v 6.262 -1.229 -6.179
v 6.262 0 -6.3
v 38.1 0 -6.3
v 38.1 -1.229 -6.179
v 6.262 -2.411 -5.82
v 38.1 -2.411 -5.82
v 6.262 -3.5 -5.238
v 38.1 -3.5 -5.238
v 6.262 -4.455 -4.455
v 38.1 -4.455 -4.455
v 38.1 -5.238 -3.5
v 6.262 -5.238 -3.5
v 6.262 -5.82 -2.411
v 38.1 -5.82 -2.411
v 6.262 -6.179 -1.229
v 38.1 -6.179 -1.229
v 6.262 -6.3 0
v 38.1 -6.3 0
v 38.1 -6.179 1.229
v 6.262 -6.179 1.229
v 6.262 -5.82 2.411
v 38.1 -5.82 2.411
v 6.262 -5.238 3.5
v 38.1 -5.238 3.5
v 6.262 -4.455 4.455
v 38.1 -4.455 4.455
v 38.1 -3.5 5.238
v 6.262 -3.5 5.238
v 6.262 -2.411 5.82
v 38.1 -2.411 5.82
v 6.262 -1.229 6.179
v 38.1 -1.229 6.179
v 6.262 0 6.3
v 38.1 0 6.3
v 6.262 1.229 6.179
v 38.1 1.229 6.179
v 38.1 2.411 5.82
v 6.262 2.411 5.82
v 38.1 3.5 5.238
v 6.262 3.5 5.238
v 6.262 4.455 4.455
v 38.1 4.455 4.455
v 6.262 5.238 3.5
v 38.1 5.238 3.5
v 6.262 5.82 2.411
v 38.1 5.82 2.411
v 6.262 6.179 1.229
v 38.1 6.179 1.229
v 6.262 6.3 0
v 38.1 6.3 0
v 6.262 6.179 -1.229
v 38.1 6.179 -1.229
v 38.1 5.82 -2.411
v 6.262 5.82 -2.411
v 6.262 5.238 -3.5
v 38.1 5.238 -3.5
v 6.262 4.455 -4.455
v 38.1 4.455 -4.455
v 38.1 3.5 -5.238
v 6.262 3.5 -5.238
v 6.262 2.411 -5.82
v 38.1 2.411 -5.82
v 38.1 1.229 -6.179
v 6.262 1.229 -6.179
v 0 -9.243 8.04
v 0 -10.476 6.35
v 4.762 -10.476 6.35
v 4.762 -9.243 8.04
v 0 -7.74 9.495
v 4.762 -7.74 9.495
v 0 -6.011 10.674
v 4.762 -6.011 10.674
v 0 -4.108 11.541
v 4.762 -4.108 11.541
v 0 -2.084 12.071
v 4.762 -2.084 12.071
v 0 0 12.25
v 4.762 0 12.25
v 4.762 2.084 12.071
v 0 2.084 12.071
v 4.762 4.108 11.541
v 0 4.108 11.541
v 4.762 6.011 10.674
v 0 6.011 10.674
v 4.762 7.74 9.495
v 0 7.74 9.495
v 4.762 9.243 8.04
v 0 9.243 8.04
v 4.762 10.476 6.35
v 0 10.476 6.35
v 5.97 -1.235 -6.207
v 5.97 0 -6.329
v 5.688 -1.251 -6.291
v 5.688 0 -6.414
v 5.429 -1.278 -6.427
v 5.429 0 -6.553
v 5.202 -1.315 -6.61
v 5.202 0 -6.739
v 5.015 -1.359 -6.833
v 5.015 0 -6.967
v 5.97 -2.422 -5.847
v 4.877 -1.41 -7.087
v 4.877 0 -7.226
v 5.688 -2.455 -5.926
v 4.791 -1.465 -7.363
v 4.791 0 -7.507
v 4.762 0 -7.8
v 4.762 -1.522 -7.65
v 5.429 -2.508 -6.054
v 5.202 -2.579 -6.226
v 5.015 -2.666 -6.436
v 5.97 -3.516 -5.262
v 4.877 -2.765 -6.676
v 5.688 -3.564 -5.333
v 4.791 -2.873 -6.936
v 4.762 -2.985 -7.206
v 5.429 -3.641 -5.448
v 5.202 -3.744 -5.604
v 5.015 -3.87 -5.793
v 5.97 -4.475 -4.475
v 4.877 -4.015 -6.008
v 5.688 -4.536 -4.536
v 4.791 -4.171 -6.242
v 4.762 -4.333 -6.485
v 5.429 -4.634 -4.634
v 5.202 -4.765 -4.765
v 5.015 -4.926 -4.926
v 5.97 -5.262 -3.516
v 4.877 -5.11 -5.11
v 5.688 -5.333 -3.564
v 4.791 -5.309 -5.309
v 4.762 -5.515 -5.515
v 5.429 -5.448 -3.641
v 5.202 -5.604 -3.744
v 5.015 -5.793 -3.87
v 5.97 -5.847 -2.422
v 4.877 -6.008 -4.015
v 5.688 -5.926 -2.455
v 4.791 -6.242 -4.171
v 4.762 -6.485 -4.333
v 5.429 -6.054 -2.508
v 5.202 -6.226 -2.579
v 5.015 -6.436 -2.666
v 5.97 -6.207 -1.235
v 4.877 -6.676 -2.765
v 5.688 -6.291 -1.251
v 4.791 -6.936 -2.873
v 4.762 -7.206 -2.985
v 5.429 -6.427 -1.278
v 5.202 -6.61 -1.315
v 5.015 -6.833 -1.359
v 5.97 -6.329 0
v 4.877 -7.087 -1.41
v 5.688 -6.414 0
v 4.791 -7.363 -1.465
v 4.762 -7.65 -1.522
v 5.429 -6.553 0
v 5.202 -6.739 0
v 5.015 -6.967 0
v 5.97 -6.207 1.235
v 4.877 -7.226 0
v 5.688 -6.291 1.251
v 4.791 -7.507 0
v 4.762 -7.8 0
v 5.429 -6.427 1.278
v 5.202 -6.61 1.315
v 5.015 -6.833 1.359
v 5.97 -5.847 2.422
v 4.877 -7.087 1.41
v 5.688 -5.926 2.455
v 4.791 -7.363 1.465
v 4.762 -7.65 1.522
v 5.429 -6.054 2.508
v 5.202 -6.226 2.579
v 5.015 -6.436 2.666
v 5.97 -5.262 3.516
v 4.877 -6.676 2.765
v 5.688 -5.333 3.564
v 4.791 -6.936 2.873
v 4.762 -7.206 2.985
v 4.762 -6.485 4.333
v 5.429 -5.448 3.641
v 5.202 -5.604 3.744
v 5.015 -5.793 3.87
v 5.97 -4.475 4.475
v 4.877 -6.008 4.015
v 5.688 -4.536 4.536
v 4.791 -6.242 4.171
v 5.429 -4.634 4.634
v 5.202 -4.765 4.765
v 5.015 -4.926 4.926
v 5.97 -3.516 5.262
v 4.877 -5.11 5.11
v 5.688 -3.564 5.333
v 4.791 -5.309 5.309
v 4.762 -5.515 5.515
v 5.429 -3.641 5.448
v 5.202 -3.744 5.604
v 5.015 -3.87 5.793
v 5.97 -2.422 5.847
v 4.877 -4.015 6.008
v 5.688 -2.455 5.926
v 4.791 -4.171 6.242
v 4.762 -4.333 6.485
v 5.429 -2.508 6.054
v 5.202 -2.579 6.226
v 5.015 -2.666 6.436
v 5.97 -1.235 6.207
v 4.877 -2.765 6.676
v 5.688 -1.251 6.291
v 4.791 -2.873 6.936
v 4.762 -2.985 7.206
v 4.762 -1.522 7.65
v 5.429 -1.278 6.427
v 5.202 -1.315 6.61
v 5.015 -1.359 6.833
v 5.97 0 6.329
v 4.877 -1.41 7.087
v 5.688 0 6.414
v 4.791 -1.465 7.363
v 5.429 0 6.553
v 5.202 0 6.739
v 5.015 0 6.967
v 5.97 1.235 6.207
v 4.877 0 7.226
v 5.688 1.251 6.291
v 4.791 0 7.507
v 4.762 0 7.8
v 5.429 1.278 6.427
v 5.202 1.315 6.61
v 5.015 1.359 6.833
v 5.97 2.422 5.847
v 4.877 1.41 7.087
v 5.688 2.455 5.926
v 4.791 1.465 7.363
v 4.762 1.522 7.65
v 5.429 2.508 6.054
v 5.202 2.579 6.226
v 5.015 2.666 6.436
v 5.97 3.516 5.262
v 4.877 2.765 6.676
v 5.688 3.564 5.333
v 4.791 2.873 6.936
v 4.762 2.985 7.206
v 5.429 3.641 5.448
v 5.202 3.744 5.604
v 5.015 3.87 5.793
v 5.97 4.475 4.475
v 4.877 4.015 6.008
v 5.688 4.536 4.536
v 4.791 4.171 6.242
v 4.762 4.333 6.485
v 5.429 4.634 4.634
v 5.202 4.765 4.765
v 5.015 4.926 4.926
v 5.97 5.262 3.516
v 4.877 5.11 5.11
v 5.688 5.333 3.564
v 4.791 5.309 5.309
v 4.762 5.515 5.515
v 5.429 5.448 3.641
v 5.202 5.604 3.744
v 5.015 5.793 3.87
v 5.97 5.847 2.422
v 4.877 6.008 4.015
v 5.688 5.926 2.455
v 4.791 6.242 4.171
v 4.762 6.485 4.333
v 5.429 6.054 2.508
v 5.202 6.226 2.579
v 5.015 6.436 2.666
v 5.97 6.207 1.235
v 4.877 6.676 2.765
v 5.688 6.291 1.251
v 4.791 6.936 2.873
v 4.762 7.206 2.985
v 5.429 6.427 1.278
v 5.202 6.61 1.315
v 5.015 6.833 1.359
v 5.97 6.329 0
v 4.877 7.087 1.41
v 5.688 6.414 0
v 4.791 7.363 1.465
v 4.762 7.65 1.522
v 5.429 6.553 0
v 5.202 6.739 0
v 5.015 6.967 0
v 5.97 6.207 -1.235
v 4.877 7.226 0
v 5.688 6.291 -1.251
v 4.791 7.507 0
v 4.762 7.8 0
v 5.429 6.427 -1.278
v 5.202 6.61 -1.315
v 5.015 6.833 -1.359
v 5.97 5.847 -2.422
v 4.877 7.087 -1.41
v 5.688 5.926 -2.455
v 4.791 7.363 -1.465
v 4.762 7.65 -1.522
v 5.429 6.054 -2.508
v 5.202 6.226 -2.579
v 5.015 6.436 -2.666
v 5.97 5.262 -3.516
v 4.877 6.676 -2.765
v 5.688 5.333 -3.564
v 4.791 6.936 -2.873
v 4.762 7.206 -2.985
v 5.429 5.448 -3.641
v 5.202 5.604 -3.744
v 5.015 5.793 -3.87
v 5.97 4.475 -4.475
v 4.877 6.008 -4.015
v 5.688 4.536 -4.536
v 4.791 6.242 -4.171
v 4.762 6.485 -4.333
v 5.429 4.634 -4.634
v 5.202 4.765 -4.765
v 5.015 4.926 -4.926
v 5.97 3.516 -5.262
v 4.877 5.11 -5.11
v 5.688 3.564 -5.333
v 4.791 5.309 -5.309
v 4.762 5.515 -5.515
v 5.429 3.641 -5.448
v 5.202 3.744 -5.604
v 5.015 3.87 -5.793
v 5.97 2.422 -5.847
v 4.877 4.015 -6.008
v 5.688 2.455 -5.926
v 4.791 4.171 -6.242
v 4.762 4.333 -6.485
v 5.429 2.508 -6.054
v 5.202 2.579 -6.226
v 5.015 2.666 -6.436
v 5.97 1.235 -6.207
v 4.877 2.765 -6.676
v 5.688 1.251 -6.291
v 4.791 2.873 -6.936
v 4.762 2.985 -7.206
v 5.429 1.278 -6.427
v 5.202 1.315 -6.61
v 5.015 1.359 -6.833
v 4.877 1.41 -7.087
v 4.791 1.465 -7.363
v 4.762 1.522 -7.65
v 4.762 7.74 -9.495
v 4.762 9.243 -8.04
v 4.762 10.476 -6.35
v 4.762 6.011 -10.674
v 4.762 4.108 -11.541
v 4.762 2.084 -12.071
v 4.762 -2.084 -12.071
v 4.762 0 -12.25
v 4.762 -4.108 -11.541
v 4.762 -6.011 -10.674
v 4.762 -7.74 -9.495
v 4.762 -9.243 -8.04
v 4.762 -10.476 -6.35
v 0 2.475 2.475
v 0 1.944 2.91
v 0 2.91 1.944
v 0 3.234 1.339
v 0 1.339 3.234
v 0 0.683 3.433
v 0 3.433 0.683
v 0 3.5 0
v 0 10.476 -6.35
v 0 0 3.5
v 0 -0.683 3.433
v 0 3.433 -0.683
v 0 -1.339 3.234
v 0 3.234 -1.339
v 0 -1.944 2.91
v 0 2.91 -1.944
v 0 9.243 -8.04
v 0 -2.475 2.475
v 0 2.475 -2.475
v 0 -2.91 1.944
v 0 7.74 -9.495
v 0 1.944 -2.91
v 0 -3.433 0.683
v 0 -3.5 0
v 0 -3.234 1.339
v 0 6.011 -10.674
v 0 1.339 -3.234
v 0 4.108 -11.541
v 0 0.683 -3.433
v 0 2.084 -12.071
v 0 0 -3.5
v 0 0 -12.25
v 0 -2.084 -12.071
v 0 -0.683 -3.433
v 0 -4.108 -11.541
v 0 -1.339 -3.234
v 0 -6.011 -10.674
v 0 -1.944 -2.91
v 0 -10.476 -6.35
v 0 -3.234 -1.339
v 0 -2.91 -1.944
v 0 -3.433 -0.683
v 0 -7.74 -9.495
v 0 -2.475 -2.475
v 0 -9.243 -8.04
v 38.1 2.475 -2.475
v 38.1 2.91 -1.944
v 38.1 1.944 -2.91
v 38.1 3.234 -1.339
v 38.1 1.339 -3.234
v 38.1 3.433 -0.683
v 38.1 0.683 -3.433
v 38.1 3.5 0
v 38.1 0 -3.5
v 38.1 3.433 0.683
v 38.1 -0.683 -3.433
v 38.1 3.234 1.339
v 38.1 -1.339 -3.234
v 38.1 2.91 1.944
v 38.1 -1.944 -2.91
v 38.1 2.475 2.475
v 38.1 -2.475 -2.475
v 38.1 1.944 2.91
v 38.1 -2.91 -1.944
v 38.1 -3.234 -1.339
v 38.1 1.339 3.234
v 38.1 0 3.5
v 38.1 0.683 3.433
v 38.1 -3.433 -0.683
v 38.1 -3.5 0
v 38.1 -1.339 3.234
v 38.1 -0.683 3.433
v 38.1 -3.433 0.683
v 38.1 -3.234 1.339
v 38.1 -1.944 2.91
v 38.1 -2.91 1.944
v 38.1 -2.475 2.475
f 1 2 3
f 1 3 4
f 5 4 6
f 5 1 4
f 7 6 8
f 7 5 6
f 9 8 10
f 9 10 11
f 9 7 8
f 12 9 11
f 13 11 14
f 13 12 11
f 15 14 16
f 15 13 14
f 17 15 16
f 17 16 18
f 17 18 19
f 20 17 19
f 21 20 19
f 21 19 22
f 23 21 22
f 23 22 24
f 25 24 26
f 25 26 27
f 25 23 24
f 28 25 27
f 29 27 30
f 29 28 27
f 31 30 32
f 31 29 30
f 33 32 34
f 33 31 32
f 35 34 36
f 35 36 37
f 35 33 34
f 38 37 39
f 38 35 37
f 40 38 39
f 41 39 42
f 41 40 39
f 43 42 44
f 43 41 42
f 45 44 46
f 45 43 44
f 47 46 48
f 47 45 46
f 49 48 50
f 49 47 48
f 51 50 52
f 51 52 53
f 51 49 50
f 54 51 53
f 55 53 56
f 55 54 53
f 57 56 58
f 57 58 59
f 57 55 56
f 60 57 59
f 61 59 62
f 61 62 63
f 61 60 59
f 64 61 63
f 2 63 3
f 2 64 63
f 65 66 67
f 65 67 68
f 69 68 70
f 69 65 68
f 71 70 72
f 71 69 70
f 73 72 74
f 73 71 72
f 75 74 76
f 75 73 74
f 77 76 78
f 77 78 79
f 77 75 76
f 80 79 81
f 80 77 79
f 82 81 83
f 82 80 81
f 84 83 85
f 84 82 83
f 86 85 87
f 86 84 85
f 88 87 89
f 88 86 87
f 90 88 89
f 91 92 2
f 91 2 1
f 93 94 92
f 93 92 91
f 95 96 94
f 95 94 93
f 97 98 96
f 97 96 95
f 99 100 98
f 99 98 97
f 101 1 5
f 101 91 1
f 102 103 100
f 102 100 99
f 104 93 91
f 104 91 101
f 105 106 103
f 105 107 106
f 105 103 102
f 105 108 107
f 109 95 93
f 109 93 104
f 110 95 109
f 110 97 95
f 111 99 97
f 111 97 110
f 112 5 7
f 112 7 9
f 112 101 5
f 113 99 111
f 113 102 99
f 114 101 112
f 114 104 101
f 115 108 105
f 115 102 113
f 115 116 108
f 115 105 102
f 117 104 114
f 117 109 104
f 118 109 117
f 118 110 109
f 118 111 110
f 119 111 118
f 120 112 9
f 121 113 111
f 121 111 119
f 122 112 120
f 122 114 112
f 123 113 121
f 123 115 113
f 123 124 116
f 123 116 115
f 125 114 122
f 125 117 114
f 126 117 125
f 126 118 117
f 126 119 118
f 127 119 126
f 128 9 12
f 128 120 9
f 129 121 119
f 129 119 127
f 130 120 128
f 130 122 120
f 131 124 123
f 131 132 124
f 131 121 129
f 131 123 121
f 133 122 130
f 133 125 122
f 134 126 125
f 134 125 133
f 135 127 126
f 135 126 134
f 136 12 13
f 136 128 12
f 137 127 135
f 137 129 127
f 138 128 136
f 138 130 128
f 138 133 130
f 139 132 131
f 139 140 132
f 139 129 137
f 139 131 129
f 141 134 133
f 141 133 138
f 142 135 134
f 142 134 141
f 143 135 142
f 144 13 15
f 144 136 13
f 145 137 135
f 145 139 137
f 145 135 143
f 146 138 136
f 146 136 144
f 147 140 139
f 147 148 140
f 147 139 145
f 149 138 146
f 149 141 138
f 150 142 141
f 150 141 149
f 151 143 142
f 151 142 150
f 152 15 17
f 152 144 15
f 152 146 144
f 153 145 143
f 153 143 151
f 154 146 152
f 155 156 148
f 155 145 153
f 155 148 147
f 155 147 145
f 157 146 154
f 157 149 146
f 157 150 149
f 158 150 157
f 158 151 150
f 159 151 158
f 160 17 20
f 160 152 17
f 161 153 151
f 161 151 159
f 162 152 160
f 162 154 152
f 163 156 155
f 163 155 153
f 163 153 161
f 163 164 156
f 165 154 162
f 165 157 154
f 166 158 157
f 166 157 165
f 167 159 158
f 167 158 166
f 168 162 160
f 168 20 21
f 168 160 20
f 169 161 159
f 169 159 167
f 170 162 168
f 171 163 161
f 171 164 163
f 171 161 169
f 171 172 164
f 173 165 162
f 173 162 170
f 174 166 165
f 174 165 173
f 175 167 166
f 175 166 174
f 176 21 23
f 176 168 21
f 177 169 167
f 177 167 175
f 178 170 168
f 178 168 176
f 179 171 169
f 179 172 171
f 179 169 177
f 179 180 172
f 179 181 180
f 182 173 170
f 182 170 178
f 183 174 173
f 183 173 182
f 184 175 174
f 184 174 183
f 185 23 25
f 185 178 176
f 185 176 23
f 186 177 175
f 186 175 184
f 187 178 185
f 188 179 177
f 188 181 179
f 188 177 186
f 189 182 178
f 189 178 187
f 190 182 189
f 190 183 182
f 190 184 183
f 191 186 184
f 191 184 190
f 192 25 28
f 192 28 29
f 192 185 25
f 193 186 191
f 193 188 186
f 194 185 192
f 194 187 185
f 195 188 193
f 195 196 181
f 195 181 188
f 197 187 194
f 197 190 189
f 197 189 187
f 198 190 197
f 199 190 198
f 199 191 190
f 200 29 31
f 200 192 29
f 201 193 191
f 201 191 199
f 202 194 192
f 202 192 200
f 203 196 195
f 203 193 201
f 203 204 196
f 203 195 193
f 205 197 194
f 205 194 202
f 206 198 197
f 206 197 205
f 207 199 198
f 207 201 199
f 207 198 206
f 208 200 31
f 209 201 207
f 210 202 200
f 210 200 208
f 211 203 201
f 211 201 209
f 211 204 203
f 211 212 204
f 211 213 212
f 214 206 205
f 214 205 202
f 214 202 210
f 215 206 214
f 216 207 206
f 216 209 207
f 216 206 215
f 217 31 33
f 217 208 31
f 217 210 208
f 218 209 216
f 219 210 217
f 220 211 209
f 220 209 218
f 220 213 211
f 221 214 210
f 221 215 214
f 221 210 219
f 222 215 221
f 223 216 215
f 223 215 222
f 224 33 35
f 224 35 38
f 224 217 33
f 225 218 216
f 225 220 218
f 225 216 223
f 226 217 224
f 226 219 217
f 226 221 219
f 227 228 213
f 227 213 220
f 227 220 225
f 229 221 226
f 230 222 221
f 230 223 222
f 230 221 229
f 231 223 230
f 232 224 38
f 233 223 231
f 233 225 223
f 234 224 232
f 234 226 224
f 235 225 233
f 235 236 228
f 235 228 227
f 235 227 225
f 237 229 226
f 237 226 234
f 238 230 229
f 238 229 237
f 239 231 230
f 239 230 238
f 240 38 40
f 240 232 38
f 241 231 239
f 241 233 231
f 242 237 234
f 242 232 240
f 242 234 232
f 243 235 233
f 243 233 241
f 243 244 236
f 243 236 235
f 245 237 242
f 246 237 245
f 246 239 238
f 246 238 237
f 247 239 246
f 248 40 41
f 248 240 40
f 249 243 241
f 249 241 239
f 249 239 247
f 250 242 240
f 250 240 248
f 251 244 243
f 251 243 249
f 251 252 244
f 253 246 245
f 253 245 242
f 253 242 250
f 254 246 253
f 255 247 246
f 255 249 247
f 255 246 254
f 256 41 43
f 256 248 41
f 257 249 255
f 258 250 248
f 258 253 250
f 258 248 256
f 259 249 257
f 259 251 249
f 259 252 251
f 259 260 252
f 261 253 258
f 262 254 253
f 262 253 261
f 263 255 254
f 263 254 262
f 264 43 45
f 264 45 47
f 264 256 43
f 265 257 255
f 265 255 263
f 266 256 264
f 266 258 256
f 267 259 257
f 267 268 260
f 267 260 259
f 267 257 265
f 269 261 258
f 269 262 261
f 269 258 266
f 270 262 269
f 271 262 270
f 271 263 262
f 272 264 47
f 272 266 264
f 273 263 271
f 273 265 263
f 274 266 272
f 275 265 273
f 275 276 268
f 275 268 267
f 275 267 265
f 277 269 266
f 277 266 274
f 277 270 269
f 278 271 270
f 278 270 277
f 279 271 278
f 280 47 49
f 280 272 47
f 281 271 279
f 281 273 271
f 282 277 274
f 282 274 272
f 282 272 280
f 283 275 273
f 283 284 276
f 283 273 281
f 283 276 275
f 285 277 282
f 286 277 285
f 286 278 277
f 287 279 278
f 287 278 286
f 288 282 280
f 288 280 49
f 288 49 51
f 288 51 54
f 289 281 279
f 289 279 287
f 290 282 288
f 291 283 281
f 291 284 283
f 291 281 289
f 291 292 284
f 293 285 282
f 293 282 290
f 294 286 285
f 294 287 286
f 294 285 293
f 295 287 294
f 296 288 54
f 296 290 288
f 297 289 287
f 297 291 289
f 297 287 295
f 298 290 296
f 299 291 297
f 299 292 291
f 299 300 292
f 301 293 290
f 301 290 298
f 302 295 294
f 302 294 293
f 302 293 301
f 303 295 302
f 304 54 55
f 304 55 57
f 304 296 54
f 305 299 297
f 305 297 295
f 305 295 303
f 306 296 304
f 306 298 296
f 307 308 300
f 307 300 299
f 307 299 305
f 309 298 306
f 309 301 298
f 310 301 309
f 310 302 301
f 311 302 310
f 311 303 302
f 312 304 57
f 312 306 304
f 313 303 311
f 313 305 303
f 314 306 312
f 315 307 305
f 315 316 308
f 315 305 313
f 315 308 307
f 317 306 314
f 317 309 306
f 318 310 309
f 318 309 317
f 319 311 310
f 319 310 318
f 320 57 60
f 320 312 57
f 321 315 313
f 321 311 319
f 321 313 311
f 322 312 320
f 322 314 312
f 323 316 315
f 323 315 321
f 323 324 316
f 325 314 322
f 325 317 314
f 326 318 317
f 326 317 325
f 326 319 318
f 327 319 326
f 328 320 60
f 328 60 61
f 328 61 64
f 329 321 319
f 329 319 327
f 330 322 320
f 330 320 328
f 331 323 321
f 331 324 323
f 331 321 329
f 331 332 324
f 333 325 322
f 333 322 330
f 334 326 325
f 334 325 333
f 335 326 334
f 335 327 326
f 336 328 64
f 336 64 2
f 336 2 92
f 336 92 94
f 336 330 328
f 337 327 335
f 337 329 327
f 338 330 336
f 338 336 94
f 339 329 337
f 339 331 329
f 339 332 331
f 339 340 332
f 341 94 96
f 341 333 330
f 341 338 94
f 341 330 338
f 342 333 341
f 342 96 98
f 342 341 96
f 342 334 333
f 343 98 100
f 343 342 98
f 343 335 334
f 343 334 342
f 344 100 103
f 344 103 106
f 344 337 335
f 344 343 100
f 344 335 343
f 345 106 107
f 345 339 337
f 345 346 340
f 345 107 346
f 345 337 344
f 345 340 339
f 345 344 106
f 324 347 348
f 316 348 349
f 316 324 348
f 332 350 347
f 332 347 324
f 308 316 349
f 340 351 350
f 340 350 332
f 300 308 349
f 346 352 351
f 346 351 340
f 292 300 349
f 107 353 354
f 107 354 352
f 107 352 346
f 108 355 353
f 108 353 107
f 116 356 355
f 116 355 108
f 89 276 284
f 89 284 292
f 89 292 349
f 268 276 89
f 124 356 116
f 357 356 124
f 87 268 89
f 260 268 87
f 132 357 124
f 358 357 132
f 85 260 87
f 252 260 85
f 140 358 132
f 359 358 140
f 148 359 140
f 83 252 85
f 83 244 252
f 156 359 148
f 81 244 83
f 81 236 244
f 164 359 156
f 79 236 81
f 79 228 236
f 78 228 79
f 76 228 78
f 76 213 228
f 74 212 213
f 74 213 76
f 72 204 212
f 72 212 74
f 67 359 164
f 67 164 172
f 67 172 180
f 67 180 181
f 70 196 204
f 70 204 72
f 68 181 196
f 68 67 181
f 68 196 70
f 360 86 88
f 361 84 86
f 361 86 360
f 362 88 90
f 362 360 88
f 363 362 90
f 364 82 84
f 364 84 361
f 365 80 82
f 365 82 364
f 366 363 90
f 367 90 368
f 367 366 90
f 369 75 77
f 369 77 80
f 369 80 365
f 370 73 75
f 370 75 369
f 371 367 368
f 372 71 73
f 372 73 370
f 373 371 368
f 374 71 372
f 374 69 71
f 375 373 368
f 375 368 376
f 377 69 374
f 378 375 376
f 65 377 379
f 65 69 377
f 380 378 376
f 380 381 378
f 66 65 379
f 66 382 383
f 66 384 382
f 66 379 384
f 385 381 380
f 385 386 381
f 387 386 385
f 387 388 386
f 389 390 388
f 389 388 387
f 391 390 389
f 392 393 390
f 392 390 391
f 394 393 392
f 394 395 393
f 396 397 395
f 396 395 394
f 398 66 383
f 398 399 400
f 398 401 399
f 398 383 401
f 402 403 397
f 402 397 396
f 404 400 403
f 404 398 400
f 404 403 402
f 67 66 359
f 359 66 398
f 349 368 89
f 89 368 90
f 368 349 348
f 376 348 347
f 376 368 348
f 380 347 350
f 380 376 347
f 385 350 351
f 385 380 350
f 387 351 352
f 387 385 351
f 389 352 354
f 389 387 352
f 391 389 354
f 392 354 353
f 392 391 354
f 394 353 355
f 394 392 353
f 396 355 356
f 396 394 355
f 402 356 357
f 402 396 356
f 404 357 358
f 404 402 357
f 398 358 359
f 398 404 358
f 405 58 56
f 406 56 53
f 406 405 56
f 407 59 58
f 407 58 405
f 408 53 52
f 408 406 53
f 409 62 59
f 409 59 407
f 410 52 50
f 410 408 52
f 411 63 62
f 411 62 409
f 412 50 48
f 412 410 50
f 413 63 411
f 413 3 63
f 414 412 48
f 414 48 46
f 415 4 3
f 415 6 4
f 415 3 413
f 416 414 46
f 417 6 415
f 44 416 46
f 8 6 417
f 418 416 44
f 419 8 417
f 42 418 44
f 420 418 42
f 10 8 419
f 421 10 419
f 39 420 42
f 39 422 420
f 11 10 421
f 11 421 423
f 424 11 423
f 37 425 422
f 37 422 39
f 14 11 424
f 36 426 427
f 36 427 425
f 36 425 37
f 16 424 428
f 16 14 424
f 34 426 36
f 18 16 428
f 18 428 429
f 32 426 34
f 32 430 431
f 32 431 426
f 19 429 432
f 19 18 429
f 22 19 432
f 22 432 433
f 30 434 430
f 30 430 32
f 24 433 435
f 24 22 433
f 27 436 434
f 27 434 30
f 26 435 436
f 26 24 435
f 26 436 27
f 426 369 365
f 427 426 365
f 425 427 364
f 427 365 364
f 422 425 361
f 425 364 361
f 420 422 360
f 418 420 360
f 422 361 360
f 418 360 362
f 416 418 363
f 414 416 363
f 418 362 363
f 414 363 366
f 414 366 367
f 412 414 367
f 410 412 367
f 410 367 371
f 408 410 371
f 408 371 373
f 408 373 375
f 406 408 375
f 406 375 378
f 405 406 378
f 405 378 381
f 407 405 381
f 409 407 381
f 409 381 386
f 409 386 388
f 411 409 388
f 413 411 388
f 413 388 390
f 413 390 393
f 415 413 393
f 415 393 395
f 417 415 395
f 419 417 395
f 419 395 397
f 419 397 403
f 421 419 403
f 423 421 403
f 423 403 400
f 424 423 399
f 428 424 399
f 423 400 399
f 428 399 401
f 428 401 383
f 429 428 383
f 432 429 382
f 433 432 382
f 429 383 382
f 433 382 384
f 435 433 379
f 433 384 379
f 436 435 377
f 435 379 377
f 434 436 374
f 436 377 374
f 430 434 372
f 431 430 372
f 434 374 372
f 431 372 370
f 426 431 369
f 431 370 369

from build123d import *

# Parameters (mm, degrees)
FILLET1_R                            = 1.5
F_5_16_18_MAKE_SURE_TO_CHANGE_THIS_D = 7
CUT_EXTRUDE1_DEPTH                   = 42.853733412


with BuildPart() as part:
    # Sketch1 → Revolve1 (revolve)
    with BuildSketch(Plane.XY, mode=Mode.PRIVATE) as revolve1_sk:
        Polygon((0, 0), (38.1, 0), (38.1, 6.299999973), (4.7625, 6.299999973), (4.7625, 12.250000011), (0, 12.250000011), align=None)
    revolve(revolve1_sk.sketch.rotate(Axis((0, 0, 0), (-1, 0, 0)), 90), axis=Axis((0, 0, 0), (-1, 0, 0)))

    # Fillet1
    fillet1_edges = [part.edges().sort_by_distance(p)[0] for p in [
        (4.7625, 0, 6.299999973),
    ]]
    fillet(fillet1_edges, radius=FILLET1_R)

    # 5/16-18 MAKE SURE TO CHANGE THIS (through all)
    with Locations(Plane(origin=(38.1, 0, 0), x_dir=(0, 0, -1), z_dir=(1, 0, 0))):
        with Locations((0, 0)):
            Hole(F_5_16_18_MAKE_SURE_TO_CHANGE_THIS_D / 2)

    # Sketch4 → Cut-Extrude1 (cut, through all)
    with BuildSketch(Plane.ZY):
        with BuildLine():
            Line((-6.35, 10.475686148), (6.35, 10.475686148))
            ThreePointArc((6.35, 10.475686148), (0, 12.250000011), (-6.35, 10.475686148))
        make_face()
        with BuildLine():
            Line((6.35, -10.475686148), (-6.35, -10.475686148))
            ThreePointArc((-6.35, -10.475686148), (0, -12.250000011), (6.35, -10.475686148))
        make_face()
    extrude(amount=-CUT_EXTRUDE1_DEPTH, mode=Mode.SUBTRACT)


solid = part.part
